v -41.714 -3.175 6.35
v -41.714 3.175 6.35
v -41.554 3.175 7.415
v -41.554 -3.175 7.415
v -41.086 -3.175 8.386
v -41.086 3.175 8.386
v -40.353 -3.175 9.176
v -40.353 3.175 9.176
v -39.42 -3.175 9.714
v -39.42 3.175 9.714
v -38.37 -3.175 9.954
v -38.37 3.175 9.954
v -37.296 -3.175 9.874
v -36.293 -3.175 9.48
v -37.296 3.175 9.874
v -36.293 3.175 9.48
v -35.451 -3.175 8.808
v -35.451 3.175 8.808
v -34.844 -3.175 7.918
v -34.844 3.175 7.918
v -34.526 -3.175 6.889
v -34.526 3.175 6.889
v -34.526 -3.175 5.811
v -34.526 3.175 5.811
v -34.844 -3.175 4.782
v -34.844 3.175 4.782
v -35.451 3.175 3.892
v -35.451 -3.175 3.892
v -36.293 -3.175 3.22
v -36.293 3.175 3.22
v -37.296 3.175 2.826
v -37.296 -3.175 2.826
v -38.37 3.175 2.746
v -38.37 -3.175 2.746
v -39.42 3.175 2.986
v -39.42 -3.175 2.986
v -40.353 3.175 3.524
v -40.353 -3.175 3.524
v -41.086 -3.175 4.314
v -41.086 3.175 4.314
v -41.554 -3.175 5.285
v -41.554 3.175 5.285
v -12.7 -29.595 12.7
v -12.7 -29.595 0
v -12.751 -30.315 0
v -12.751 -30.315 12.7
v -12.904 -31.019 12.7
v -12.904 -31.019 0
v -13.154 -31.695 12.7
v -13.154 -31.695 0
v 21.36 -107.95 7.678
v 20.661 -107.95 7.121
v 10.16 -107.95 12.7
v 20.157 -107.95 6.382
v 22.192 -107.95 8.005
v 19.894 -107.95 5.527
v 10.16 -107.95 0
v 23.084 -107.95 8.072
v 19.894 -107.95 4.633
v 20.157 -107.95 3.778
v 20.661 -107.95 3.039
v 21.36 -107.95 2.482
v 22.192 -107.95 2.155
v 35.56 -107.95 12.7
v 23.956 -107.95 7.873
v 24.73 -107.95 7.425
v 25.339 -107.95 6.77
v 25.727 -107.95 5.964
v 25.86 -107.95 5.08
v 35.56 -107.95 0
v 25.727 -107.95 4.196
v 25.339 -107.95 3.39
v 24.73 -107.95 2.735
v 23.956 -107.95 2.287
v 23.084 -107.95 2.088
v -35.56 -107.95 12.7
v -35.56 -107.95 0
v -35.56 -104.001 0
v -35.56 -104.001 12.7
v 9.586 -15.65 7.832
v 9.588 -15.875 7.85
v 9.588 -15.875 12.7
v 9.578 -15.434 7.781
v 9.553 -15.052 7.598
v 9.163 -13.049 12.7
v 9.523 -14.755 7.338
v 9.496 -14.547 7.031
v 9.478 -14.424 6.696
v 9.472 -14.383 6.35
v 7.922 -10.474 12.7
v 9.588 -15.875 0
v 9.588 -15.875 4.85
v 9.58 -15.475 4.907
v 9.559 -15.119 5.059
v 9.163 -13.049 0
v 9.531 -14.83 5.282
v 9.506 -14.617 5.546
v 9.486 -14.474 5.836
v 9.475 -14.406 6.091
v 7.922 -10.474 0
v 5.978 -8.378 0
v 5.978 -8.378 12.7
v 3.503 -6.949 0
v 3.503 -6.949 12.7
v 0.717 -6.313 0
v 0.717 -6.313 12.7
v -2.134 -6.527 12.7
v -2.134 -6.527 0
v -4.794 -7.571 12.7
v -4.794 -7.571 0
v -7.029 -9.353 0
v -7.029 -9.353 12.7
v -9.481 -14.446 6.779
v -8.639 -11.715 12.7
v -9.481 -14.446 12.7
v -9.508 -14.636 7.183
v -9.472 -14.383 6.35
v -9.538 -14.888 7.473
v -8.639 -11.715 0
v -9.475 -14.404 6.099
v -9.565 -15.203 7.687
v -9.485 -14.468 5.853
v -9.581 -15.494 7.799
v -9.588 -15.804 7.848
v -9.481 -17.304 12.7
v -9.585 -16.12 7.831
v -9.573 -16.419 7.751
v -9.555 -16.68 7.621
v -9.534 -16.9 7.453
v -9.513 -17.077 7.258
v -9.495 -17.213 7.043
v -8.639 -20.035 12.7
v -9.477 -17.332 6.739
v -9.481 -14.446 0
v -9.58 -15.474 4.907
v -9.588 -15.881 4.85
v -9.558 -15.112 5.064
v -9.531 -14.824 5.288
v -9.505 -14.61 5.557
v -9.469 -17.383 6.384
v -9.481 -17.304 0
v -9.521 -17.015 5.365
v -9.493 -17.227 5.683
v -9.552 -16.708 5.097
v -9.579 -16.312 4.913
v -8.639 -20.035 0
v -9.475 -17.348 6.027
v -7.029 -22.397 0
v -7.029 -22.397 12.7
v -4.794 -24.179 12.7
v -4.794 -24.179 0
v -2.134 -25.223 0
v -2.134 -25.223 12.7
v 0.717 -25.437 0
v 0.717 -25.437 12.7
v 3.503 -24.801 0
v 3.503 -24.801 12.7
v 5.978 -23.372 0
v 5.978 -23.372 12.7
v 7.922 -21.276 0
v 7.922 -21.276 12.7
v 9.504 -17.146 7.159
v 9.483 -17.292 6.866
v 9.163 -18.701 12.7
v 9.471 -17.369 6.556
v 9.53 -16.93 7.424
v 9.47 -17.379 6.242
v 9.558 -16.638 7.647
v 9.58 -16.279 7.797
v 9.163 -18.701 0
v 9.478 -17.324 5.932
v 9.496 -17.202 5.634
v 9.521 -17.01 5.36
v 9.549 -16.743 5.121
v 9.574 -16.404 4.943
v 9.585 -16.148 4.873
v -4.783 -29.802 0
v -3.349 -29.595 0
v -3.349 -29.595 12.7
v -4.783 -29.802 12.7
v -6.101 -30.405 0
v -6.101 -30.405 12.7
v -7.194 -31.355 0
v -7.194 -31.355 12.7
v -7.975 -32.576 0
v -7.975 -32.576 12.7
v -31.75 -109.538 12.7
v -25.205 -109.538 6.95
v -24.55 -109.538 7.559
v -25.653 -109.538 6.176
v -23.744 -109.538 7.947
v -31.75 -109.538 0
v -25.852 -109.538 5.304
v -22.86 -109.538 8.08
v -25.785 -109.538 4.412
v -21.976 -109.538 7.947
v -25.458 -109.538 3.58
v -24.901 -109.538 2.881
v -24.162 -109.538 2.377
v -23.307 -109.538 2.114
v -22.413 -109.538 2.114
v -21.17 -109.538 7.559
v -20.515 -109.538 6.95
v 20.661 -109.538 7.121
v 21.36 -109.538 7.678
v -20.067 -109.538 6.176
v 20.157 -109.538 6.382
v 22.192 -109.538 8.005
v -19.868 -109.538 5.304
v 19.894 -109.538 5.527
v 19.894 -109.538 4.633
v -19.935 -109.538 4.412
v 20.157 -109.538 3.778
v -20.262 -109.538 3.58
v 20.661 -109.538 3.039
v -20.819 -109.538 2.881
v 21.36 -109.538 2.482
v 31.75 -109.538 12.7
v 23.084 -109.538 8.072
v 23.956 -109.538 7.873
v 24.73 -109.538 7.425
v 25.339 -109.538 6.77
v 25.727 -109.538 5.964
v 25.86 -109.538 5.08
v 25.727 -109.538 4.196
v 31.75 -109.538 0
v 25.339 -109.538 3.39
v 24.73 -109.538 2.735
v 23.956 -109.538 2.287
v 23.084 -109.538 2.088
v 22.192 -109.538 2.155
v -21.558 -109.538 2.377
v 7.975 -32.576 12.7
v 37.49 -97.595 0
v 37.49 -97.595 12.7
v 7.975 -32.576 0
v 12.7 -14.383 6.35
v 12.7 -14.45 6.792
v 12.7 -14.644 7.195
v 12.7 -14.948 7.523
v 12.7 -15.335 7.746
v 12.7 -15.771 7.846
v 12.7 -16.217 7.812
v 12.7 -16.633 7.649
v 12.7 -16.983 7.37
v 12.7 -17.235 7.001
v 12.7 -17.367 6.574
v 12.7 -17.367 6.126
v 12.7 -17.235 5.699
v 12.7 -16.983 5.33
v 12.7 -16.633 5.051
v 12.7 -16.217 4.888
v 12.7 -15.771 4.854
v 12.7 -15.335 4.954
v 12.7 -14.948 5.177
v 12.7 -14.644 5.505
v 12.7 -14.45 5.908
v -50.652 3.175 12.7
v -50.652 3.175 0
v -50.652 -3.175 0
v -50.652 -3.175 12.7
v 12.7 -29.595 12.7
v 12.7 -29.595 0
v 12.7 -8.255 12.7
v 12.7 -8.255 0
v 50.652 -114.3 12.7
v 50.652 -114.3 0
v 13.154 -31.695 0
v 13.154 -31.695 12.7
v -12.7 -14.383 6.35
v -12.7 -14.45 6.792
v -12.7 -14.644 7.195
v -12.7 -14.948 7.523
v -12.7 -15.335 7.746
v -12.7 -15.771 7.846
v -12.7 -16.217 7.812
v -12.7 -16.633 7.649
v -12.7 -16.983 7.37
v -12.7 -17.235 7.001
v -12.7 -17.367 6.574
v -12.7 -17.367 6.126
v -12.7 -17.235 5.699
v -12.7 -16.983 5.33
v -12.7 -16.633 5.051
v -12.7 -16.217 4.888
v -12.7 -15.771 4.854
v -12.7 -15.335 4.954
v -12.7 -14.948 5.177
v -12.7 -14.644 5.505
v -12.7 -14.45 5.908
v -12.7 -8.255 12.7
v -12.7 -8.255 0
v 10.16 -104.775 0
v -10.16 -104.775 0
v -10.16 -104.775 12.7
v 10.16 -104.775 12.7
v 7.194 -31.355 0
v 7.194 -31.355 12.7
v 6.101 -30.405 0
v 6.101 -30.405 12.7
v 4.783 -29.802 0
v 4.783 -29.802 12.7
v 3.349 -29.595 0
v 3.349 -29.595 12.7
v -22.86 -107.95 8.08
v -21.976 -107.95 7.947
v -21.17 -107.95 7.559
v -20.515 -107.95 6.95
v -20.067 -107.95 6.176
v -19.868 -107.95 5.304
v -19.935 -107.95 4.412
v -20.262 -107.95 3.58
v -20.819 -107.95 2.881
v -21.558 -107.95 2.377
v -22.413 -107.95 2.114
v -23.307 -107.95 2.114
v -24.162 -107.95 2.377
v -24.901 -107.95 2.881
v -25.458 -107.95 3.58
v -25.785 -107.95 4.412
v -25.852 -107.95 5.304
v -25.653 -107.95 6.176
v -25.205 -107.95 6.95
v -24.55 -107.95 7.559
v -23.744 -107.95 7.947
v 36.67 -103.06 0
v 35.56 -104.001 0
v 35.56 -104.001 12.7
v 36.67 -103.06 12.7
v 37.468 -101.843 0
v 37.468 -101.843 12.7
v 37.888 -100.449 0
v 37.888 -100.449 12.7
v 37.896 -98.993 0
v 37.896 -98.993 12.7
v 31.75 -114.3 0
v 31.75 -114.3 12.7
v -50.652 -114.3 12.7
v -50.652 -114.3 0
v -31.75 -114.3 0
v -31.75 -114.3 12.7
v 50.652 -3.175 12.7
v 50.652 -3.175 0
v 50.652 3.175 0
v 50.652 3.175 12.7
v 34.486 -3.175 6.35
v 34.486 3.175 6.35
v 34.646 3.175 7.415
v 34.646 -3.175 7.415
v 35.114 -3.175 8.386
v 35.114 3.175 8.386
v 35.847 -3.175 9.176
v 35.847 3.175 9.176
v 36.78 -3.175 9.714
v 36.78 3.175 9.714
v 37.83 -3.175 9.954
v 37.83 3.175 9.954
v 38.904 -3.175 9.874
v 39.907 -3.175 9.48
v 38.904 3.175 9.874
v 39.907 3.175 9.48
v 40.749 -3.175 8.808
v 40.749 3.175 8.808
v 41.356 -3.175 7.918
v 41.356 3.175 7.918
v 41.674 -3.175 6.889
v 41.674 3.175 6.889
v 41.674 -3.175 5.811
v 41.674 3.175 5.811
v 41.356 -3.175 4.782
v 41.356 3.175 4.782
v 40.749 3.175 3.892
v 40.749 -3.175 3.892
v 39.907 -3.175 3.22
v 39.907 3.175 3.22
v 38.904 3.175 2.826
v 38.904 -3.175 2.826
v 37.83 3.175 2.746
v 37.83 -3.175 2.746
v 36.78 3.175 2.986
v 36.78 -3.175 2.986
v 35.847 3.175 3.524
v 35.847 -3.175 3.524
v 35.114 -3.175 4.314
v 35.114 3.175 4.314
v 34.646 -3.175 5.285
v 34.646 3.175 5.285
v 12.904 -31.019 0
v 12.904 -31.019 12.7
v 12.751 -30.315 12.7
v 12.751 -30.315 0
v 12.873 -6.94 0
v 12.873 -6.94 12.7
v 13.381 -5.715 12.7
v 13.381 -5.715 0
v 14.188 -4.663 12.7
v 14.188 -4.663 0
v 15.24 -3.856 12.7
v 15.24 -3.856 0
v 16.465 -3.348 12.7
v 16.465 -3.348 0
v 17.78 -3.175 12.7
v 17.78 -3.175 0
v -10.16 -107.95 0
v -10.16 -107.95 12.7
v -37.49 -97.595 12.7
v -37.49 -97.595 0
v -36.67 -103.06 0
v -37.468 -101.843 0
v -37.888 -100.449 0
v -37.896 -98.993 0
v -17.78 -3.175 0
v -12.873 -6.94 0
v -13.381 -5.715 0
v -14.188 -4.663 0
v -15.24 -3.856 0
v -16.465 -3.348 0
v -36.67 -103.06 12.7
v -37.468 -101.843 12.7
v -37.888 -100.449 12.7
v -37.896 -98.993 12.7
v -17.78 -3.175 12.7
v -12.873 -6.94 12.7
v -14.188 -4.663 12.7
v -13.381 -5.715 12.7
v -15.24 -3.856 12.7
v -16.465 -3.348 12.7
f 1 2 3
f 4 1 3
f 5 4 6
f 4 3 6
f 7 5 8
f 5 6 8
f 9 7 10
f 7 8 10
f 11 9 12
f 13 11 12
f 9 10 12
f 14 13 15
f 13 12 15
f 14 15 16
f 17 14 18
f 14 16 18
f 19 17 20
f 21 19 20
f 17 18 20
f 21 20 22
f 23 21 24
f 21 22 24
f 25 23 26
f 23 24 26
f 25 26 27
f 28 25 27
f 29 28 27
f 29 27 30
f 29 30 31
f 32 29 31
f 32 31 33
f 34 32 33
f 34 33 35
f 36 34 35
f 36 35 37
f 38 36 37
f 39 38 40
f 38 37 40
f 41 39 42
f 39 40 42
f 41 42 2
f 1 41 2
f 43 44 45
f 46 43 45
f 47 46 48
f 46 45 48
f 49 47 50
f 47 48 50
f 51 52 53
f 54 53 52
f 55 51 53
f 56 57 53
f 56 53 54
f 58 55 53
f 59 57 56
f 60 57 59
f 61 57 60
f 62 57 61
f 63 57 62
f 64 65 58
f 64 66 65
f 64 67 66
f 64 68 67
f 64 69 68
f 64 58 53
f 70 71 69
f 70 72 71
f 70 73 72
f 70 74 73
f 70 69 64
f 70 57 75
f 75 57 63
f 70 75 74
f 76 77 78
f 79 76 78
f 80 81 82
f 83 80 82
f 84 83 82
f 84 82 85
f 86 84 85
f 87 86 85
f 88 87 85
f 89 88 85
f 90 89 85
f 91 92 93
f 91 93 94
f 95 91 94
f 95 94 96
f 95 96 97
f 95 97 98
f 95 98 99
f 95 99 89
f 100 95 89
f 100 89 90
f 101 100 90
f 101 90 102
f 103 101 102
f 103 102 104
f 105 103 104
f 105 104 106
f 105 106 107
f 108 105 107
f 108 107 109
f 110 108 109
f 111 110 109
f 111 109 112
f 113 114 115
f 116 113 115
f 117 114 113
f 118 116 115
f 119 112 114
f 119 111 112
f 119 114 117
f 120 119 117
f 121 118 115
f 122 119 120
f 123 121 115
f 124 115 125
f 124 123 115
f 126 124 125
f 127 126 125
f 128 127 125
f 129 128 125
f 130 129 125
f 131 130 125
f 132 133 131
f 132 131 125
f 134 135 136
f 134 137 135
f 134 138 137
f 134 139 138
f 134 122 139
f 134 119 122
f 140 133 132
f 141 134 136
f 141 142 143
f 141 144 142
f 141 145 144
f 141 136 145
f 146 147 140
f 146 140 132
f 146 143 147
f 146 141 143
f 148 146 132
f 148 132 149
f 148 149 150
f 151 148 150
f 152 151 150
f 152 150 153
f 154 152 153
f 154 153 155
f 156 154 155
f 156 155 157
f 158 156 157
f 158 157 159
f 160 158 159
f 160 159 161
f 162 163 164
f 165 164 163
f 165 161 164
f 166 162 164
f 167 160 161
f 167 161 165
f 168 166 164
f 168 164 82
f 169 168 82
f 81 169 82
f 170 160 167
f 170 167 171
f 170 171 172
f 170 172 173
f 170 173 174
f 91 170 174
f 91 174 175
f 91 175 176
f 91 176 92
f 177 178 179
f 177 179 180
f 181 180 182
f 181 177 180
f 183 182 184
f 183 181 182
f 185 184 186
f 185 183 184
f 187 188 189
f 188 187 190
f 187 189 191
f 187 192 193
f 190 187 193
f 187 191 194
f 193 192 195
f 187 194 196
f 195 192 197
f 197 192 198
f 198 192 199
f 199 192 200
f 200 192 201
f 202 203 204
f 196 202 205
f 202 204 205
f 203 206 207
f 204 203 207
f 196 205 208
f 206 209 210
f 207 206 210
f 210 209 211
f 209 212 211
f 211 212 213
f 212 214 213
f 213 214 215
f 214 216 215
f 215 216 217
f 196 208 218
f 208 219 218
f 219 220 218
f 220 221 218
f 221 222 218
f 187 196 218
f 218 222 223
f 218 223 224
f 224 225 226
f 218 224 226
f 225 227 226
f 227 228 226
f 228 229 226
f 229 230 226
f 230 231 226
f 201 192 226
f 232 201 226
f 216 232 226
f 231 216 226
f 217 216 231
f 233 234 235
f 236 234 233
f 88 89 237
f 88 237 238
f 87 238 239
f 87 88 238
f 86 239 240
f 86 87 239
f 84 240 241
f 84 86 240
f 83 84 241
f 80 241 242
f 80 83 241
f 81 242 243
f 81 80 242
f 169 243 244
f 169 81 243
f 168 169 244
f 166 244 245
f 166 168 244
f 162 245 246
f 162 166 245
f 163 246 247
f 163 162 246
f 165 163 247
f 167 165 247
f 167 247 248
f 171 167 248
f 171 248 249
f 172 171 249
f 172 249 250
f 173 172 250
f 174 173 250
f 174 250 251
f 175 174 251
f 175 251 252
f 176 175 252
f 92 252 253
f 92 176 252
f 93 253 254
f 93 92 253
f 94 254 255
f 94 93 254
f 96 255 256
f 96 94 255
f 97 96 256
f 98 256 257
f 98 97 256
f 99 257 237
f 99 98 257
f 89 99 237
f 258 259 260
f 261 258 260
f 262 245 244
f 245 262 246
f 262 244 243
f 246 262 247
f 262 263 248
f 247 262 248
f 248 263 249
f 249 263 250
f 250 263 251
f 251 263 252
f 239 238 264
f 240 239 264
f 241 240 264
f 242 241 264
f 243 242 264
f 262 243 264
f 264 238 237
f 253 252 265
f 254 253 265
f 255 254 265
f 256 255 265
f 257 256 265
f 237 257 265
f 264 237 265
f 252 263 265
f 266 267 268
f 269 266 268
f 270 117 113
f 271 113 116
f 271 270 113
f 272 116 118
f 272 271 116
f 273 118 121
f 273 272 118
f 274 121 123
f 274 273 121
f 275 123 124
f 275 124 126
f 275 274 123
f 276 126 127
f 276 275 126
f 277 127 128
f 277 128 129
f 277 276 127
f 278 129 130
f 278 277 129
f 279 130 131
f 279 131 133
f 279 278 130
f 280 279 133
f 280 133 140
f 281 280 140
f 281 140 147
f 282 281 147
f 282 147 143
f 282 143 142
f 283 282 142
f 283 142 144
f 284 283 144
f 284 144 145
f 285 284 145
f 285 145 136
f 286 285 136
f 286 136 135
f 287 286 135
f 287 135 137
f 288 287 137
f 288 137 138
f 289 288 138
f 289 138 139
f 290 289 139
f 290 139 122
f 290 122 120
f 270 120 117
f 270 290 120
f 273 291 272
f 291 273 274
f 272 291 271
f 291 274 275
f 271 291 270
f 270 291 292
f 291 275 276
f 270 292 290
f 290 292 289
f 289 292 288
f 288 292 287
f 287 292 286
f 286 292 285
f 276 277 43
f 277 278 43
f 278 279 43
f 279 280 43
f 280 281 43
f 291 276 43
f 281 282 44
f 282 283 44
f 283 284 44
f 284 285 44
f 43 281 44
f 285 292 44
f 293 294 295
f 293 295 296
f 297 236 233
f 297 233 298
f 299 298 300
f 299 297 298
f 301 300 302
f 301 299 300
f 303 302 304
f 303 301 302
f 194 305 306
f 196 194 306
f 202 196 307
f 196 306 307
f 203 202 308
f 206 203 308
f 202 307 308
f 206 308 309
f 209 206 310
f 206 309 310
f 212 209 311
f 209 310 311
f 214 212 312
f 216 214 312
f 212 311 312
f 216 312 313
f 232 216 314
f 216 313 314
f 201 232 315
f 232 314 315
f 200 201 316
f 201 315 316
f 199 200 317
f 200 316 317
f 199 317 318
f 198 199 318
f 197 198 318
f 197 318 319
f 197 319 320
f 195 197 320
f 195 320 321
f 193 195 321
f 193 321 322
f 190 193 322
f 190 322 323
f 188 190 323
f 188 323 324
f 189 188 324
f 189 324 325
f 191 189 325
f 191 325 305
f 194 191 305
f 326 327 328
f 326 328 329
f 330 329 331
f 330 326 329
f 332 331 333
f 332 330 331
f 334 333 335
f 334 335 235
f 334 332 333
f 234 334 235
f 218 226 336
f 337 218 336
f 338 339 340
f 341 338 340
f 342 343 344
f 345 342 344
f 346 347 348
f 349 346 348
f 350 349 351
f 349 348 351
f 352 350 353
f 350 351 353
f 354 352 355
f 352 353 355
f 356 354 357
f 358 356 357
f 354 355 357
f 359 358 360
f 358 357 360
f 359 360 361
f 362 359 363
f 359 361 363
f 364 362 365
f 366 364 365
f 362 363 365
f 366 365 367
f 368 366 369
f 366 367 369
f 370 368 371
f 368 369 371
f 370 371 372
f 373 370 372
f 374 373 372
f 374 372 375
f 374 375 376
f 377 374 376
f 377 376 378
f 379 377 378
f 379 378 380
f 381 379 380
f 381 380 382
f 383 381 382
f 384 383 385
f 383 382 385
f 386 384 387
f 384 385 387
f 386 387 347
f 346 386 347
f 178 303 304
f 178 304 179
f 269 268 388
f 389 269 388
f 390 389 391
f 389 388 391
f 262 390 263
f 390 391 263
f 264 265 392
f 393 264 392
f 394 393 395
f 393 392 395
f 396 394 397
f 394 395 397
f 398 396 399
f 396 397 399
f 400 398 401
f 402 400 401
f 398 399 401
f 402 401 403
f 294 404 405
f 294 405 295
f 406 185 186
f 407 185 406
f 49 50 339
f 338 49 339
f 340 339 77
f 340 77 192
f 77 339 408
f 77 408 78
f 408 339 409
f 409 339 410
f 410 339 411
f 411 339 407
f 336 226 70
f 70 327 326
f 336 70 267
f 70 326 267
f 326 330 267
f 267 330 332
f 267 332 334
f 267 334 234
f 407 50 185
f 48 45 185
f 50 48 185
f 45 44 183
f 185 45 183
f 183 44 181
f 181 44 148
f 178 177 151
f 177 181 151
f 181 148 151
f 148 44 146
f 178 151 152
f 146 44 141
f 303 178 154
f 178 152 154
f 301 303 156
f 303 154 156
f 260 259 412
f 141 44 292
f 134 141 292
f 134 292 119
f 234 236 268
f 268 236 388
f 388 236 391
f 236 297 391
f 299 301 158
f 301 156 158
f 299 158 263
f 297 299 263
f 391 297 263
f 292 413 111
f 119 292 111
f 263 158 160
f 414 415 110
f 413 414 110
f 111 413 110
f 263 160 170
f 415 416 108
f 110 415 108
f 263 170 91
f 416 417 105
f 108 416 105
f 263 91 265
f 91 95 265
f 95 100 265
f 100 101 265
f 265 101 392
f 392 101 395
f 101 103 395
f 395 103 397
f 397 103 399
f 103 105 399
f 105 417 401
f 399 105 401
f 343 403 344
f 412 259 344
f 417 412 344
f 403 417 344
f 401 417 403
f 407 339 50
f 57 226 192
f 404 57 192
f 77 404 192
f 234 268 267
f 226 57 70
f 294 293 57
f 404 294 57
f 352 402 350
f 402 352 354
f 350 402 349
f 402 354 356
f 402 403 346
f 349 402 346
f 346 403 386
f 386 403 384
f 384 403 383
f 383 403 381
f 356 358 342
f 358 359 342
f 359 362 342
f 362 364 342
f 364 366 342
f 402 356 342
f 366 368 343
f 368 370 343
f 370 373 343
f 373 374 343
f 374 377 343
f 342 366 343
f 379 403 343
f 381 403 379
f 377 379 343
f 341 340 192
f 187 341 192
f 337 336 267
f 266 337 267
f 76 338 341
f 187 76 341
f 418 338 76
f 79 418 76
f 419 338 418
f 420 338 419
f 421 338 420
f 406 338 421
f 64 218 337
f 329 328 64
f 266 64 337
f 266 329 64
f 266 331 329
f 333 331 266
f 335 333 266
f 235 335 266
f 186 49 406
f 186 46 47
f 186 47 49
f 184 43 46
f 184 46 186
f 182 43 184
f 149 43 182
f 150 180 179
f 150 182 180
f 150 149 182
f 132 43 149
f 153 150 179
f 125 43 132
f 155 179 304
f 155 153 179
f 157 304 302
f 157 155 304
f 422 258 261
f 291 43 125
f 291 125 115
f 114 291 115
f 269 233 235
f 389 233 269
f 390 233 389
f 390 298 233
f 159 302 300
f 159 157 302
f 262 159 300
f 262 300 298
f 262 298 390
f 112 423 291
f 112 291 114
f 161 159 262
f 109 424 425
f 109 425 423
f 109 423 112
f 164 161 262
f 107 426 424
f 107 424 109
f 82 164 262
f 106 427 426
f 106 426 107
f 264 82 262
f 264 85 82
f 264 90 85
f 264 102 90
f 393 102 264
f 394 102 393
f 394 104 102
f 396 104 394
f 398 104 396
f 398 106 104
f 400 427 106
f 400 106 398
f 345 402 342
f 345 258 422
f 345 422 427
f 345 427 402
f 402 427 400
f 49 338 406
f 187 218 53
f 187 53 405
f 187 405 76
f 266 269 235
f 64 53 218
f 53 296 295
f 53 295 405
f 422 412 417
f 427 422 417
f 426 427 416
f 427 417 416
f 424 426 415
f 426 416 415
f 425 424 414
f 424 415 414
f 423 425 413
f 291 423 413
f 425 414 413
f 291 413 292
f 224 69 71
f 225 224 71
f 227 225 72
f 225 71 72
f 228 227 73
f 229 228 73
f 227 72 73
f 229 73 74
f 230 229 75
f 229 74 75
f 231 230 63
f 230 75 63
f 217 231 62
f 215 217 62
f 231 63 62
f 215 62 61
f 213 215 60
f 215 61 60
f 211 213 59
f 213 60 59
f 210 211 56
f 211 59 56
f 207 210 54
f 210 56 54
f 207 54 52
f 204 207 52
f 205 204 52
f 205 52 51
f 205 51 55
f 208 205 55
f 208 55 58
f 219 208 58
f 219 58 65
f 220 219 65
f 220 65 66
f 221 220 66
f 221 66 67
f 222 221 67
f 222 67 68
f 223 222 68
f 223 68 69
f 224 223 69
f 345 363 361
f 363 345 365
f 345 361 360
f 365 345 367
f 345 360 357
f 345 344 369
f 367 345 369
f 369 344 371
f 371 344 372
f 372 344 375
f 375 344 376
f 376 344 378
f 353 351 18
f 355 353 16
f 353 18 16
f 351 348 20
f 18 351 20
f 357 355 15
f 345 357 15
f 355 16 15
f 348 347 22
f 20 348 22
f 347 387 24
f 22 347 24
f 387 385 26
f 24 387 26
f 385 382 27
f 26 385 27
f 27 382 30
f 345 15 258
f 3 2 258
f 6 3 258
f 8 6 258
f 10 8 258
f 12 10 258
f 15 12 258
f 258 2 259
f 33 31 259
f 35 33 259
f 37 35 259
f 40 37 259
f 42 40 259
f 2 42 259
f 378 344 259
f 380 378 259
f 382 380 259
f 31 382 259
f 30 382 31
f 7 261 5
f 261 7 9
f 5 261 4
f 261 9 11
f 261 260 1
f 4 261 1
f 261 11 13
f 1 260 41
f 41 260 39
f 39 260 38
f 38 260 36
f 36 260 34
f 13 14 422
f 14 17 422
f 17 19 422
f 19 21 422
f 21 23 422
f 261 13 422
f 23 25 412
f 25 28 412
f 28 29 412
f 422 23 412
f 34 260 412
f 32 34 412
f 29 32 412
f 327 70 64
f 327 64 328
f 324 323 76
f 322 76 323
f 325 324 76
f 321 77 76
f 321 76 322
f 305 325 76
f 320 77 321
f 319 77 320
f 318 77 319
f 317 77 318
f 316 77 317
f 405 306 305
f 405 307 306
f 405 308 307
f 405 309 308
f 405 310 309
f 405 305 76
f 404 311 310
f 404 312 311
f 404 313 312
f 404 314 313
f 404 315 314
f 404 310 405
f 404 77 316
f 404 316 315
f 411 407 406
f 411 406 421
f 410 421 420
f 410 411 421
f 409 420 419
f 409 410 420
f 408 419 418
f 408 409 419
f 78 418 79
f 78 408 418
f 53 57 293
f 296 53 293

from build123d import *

# Parameters (mm, degrees)
SKETCH3_R               = 9.5885
BOSS_EXTRUDE1_DEPTH     = 12.7
SKETCH4_R               = 3.614257139
CUT_EXTRUDE1_DEPTH      = 6.35
CUT_EXTRUDE2_START      = -12.7
CUT_EXTRUDE2_OUTLINE_R  = 1.5
CUT_EXTRUDE2_DEPTH      = 25.4
CUT_EXTRUDE3_DEPTH      = 126.664030474
CUT_EXTRUDE3_DEPTH_BACK = 126.664030474
SKETCH8_W               = 25.4
SKETCH8_H               = 5.08
SKETCH9_R               = 3
CUT_EXTRUDE4_DEPTH      = 123.783240632


# Read off the part's stored shape, not the designer's step: Cut-Extrude2
with BuildPart() as part:
    # Sketch3 → Boss-Extrude1 (new body)
    with BuildSketch(Plane.XY):
        with BuildLine():
            Line((50.652428891, 3.175), (-50.652428891, 3.175))
            Line((-50.652428891, 3.175), (-50.652428891, -3.175))
            Line((-50.652428891, -3.175), (-17.78, -3.175))
            ThreePointArc((-17.78, -3.175), (-14.187897552, -4.662897552), (-12.7, -8.255))
            Line((-12.7, -8.255), (-12.7, -29.595434395))
            ThreePointArc((-12.7, -29.595434395), (-12.814872576, -30.66963627), (-13.154295145, -31.69525691))
            Line((-13.154295145, -31.69525691), (-50.652428891, -114.3))
            Line((-50.652428891, -114.3), (-31.75, -114.3))
            Line((-31.75, -114.3), (-31.75, -109.5375))
            Line((-31.75, -109.5375), (31.75, -109.5375))
            Line((31.75, -109.5375), (31.75, -114.3))
            Line((31.75, -114.3), (50.652428891, -114.3))
            Line((50.652428891, -114.3), (13.154295145, -31.69525691))
            ThreePointArc((13.154295145, -31.69525691), (12.814872576, -30.66963627), (12.7, -29.595434395))
            Line((12.7, -29.595434395), (12.7, -8.255))
            ThreePointArc((12.7, -8.255), (14.187897552, -4.662897552), (17.78, -3.175))
            Line((17.78, -3.175), (50.652428891, -3.175))
            Line((50.652428891, -3.175), (50.652428891, 3.175))
        make_face()
        with Locations((0, -15.875)):
            Circle(SKETCH3_R, mode=Mode.SUBTRACT)
        with BuildLine():
            Line((-7.97501727, -32.575611881), (-37.490421301, -97.595177486))
            ThreePointArc((-37.490421301, -97.595177486), (-37.135167146, -102.446299841), (-32.864716446, -104.775))
            Line((-32.864716446, -104.775), (0, -104.775))
            Line((0, -104.775), (32.864716446, -104.775))
            ThreePointArc((32.864716446, -104.775), (37.135167146, -102.446299841), (37.490421301, -97.595177486))
            Line((37.490421301, -97.595177486), (7.97501727, -32.575611881))
            ThreePointArc((7.97501727, -32.575611881), (6.100612256, -30.404983695), (3.349312415, -29.595434395))
            Line((3.349312415, -29.595434395), (-3.349312415, -29.595434395))
            ThreePointArc((-3.349312415, -29.595434395), (-6.100612256, -30.404983695), (-7.97501727, -32.575611881))
        make_face(mode=Mode.SUBTRACT)
    extrude(amount=BOSS_EXTRUDE1_DEPTH)

    # Sketch4 → Cut-Extrude1 (cut)
    with BuildSketch(Plane(origin=(0, 3.175, 0), x_dir=(1, 0, 0), z_dir=(0, 1, 0))):
        with Locations(Location((-38.1, -6.35, 0), (0, 0, 180))):
            Circle(SKETCH4_R)
        with Locations(Location((38.1, -6.35, 0), (0, 0, 180))):
            Circle(SKETCH4_R)
    extrude(amount=-CUT_EXTRUDE1_DEPTH, mode=Mode.SUBTRACT)

    # Cut-Extrude2 outline → Cut-Extrude2 (cut)
    with BuildSketch(Plane.YZ.offset(CUT_EXTRUDE2_START)):
        with Locations((-15.883331584, 6.35)):
            Circle(CUT_EXTRUDE2_OUTLINE_R)
    extrude(amount=CUT_EXTRUDE2_DEPTH, mode=Mode.SUBTRACT)

    # Sketch8 → Cut-Extrude3 (cut, two sides: drawn at the far end of the back side and taken through both)
    with BuildSketch(Plane.XY.offset(12.7).offset(-CUT_EXTRUDE3_DEPTH_BACK)):
        with Locations((-22.86, -105.41)):
            Rectangle(SKETCH8_W, SKETCH8_H)
        with Locations((22.86, -105.41)):
            Rectangle(SKETCH8_W, SKETCH8_H)
    extrude(amount=CUT_EXTRUDE3_DEPTH + CUT_EXTRUDE3_DEPTH_BACK, mode=Mode.SUBTRACT)

    # Sketch9 → Cut-Extrude4 (cut, through all)
    with BuildSketch(Plane(origin=(0, -107.95, 0), x_dir=(1, 0, 0), z_dir=(0, 1, 0))):
        with Locations(Location((-22.86, -5.08, 0), (0, 0, 270))):
            Circle(SKETCH9_R)
        with Locations((22.86, -5.08)):
            Circle(SKETCH9_R)
    extrude(amount=-CUT_EXTRUDE4_DEPTH, mode=Mode.SUBTRACT)


solid = part.part
